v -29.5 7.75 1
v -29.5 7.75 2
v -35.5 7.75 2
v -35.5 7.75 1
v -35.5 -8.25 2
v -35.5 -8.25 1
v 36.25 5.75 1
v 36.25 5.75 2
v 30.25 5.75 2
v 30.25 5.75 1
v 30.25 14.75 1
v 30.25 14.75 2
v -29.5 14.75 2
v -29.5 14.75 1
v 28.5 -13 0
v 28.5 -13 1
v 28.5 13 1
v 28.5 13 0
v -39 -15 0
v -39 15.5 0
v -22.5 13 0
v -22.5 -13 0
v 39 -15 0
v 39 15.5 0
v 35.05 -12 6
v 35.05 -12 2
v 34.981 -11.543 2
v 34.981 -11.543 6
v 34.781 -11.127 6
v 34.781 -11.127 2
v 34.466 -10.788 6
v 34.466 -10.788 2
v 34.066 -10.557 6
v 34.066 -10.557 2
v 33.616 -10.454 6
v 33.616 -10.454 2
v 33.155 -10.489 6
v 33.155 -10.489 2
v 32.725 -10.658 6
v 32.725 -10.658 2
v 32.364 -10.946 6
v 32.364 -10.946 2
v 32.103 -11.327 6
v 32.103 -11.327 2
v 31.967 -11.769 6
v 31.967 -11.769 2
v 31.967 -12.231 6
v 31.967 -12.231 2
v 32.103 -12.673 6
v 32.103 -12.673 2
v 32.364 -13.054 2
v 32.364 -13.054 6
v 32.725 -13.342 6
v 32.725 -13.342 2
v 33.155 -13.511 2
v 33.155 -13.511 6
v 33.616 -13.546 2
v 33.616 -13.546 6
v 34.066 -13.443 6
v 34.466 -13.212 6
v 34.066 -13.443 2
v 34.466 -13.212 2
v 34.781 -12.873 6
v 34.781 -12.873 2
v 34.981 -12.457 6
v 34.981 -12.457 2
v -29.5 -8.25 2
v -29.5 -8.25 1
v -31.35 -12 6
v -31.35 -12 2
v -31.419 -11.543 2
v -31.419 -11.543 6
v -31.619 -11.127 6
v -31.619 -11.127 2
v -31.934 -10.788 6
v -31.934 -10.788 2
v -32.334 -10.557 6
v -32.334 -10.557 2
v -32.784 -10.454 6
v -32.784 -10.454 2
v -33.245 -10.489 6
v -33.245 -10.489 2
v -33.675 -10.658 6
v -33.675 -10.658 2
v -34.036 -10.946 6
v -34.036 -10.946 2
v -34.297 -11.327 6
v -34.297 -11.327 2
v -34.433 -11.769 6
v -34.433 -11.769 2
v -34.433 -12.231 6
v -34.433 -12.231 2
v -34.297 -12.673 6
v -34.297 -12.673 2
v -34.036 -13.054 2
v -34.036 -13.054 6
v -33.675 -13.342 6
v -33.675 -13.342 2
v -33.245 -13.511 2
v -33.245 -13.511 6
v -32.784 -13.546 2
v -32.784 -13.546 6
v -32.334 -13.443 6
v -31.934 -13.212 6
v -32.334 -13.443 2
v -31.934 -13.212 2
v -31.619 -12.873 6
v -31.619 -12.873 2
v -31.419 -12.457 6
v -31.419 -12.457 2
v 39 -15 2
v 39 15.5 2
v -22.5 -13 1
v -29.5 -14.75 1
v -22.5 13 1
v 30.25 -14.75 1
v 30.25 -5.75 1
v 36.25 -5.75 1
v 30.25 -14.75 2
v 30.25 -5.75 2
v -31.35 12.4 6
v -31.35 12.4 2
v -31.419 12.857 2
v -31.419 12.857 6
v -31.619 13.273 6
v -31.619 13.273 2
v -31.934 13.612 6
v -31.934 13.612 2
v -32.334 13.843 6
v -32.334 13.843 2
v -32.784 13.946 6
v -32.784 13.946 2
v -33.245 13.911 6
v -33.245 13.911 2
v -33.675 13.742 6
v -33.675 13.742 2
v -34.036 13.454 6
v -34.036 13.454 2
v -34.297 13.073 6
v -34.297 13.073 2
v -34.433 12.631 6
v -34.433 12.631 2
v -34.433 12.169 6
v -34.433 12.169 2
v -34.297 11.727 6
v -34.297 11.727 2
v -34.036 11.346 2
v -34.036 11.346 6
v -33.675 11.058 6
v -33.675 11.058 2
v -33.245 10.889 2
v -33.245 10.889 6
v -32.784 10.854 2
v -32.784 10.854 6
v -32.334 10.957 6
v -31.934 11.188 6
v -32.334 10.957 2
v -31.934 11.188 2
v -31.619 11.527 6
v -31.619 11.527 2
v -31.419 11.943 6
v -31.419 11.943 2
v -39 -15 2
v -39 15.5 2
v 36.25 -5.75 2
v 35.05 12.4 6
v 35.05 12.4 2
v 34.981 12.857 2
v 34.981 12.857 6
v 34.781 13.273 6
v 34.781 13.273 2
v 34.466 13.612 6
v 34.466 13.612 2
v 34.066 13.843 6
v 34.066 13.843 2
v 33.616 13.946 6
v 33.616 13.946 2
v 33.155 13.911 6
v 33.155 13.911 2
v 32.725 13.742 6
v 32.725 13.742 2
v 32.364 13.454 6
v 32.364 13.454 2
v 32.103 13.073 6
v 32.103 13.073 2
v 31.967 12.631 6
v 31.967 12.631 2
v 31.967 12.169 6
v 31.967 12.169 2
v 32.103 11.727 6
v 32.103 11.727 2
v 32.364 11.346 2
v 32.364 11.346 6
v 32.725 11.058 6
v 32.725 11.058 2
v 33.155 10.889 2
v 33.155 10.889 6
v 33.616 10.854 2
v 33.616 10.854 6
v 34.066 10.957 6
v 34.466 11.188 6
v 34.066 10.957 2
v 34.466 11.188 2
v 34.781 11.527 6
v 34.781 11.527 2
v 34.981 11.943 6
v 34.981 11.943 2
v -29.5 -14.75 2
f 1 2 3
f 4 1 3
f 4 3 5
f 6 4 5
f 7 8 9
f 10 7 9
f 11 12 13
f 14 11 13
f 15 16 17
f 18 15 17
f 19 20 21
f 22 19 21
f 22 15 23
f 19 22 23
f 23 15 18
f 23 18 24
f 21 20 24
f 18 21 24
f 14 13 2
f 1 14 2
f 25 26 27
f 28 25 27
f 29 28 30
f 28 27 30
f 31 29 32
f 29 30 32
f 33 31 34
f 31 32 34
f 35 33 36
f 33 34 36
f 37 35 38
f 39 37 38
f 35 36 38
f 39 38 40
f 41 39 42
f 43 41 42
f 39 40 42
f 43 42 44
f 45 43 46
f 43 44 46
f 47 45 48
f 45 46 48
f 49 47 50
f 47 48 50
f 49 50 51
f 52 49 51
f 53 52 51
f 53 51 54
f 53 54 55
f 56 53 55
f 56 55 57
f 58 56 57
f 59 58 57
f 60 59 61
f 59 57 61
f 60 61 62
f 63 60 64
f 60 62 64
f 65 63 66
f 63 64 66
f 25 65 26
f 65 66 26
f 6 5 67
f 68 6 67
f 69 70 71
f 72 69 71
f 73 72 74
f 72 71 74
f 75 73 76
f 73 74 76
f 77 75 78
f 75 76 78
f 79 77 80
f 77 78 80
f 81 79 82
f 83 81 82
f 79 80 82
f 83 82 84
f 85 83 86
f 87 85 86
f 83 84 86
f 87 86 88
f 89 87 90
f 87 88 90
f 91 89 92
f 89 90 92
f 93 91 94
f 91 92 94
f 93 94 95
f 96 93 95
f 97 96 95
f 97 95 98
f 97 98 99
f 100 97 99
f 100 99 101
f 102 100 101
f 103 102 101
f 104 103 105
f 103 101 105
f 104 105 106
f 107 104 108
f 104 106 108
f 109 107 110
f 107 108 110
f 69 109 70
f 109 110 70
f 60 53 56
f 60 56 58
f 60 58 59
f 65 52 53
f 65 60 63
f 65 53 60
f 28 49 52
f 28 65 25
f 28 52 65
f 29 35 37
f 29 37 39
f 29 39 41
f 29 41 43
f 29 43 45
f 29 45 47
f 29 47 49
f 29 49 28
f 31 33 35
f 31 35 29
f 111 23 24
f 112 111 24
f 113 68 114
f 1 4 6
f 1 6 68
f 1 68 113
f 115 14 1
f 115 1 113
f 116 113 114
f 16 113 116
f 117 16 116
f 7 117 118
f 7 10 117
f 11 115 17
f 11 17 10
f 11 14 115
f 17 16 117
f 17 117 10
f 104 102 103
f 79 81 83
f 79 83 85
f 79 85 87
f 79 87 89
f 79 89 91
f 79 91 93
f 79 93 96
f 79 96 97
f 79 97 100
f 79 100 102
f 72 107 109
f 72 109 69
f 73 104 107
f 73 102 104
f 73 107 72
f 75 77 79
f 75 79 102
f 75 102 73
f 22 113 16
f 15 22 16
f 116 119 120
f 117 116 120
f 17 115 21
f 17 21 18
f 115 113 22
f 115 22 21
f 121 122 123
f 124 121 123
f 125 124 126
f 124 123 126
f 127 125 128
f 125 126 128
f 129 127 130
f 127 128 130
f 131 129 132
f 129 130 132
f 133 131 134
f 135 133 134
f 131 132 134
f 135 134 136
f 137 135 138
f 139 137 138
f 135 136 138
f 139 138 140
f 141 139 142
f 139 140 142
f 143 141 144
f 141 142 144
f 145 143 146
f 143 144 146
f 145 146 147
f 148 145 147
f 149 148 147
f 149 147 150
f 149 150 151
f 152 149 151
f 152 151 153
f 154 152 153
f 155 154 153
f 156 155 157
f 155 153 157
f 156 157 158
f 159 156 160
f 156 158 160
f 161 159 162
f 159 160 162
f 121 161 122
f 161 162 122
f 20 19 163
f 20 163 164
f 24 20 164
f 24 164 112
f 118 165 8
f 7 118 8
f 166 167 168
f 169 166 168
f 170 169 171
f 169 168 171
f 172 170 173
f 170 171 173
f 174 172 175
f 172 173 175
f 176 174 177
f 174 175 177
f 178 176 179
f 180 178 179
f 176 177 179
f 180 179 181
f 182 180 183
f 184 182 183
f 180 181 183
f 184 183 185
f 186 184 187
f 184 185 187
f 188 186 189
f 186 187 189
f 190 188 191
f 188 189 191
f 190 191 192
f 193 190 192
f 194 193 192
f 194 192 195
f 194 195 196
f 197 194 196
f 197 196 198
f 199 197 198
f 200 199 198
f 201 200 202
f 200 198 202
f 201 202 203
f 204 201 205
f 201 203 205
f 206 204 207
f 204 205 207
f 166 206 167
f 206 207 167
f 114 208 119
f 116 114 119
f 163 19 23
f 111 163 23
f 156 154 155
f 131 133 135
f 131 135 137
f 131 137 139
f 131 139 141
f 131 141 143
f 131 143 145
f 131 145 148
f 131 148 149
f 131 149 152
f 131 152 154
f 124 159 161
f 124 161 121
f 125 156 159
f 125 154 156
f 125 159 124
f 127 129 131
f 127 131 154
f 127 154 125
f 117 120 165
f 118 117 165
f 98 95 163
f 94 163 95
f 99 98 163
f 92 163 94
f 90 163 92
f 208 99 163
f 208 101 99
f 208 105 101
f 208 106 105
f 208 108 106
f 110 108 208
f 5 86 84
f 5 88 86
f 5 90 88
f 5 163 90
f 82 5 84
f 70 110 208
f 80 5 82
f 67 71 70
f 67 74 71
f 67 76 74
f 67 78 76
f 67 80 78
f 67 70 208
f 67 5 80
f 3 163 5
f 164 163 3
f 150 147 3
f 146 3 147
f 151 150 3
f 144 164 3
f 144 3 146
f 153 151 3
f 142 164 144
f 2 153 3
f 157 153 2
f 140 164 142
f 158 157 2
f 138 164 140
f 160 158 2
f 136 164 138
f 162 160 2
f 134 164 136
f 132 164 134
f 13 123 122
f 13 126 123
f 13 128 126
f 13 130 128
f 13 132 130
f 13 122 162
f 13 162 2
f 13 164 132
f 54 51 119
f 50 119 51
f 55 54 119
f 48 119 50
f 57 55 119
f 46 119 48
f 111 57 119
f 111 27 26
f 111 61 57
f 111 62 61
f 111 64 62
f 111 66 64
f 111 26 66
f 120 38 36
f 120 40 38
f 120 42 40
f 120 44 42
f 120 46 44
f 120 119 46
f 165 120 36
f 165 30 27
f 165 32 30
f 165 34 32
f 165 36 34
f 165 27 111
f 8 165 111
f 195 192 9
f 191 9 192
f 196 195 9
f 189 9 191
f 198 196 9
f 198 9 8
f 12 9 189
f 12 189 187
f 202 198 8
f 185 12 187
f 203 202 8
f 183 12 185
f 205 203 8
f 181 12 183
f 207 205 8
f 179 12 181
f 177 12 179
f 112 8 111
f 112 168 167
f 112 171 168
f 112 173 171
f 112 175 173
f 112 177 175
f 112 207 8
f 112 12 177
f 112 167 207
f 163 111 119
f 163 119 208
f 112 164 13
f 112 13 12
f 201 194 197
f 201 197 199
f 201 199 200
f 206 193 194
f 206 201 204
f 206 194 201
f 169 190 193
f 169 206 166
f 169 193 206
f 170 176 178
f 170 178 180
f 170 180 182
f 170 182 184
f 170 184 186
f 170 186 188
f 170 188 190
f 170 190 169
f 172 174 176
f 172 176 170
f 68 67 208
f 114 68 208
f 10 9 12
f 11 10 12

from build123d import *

# Parameters (mm, degrees)
SKETCH_W        = 78
SKETCH_H        = 30.5
PAD_DEPTH       = 2
SKETCH002_W     = 51
SKETCH002_H     = 26
POCKET_DEPTH    = 5
POCKET001_DEPTH = 1
SKETCH001_R     = 1.55
PAD001_DEPTH    = 4


with BuildPart() as part:
    # Sketch → Pad (new body)
    with BuildSketch(Plane.XY):
        with Locations((0, 0.25)):
            Rectangle(SKETCH_W, SKETCH_H)
    extrude(amount=PAD_DEPTH)

    # Sketch002 (on Face6 of Pad) → Pocket (cut)
    with BuildSketch(Plane.XY.offset(2)):
        with Locations((3, 0)):
            Rectangle(SKETCH002_W, SKETCH002_H)
    extrude(amount=-POCKET_DEPTH, mode=Mode.SUBTRACT)

    # Sketch003 (on Face5 of Pocket) → Pocket001 (cut)
    with BuildSketch(Plane.XY.offset(2)):
        Polygon((-35.5, 7.75), (-35.5, -8.25), (-29.5, -8.25), (-29.5, -14.75), (30.25, -14.75), (30.25, -5.75), (36.25, -5.75), (36.25, 5.75), (30.25, 5.75), (30.25, 14.75), (-29.5, 14.75), (-29.5, 7.75), align=None)
    extrude(amount=-POCKET001_DEPTH, mode=Mode.SUBTRACT)

    # Sketch001 (on Face5 of Pocket) → Pad001 (join)
    with BuildSketch(Plane.XY.offset(2)):
        with Locations((33.5, 12.4)):
            Circle(SKETCH001_R)
        with Locations((33.5, -12)):
            Circle(SKETCH001_R)
        with Locations((-32.9, 12.4)):
            Circle(SKETCH001_R)
        with Locations((-32.9, -12)):
            Circle(SKETCH001_R)
    extrude(amount=PAD001_DEPTH)


solid = part.part
